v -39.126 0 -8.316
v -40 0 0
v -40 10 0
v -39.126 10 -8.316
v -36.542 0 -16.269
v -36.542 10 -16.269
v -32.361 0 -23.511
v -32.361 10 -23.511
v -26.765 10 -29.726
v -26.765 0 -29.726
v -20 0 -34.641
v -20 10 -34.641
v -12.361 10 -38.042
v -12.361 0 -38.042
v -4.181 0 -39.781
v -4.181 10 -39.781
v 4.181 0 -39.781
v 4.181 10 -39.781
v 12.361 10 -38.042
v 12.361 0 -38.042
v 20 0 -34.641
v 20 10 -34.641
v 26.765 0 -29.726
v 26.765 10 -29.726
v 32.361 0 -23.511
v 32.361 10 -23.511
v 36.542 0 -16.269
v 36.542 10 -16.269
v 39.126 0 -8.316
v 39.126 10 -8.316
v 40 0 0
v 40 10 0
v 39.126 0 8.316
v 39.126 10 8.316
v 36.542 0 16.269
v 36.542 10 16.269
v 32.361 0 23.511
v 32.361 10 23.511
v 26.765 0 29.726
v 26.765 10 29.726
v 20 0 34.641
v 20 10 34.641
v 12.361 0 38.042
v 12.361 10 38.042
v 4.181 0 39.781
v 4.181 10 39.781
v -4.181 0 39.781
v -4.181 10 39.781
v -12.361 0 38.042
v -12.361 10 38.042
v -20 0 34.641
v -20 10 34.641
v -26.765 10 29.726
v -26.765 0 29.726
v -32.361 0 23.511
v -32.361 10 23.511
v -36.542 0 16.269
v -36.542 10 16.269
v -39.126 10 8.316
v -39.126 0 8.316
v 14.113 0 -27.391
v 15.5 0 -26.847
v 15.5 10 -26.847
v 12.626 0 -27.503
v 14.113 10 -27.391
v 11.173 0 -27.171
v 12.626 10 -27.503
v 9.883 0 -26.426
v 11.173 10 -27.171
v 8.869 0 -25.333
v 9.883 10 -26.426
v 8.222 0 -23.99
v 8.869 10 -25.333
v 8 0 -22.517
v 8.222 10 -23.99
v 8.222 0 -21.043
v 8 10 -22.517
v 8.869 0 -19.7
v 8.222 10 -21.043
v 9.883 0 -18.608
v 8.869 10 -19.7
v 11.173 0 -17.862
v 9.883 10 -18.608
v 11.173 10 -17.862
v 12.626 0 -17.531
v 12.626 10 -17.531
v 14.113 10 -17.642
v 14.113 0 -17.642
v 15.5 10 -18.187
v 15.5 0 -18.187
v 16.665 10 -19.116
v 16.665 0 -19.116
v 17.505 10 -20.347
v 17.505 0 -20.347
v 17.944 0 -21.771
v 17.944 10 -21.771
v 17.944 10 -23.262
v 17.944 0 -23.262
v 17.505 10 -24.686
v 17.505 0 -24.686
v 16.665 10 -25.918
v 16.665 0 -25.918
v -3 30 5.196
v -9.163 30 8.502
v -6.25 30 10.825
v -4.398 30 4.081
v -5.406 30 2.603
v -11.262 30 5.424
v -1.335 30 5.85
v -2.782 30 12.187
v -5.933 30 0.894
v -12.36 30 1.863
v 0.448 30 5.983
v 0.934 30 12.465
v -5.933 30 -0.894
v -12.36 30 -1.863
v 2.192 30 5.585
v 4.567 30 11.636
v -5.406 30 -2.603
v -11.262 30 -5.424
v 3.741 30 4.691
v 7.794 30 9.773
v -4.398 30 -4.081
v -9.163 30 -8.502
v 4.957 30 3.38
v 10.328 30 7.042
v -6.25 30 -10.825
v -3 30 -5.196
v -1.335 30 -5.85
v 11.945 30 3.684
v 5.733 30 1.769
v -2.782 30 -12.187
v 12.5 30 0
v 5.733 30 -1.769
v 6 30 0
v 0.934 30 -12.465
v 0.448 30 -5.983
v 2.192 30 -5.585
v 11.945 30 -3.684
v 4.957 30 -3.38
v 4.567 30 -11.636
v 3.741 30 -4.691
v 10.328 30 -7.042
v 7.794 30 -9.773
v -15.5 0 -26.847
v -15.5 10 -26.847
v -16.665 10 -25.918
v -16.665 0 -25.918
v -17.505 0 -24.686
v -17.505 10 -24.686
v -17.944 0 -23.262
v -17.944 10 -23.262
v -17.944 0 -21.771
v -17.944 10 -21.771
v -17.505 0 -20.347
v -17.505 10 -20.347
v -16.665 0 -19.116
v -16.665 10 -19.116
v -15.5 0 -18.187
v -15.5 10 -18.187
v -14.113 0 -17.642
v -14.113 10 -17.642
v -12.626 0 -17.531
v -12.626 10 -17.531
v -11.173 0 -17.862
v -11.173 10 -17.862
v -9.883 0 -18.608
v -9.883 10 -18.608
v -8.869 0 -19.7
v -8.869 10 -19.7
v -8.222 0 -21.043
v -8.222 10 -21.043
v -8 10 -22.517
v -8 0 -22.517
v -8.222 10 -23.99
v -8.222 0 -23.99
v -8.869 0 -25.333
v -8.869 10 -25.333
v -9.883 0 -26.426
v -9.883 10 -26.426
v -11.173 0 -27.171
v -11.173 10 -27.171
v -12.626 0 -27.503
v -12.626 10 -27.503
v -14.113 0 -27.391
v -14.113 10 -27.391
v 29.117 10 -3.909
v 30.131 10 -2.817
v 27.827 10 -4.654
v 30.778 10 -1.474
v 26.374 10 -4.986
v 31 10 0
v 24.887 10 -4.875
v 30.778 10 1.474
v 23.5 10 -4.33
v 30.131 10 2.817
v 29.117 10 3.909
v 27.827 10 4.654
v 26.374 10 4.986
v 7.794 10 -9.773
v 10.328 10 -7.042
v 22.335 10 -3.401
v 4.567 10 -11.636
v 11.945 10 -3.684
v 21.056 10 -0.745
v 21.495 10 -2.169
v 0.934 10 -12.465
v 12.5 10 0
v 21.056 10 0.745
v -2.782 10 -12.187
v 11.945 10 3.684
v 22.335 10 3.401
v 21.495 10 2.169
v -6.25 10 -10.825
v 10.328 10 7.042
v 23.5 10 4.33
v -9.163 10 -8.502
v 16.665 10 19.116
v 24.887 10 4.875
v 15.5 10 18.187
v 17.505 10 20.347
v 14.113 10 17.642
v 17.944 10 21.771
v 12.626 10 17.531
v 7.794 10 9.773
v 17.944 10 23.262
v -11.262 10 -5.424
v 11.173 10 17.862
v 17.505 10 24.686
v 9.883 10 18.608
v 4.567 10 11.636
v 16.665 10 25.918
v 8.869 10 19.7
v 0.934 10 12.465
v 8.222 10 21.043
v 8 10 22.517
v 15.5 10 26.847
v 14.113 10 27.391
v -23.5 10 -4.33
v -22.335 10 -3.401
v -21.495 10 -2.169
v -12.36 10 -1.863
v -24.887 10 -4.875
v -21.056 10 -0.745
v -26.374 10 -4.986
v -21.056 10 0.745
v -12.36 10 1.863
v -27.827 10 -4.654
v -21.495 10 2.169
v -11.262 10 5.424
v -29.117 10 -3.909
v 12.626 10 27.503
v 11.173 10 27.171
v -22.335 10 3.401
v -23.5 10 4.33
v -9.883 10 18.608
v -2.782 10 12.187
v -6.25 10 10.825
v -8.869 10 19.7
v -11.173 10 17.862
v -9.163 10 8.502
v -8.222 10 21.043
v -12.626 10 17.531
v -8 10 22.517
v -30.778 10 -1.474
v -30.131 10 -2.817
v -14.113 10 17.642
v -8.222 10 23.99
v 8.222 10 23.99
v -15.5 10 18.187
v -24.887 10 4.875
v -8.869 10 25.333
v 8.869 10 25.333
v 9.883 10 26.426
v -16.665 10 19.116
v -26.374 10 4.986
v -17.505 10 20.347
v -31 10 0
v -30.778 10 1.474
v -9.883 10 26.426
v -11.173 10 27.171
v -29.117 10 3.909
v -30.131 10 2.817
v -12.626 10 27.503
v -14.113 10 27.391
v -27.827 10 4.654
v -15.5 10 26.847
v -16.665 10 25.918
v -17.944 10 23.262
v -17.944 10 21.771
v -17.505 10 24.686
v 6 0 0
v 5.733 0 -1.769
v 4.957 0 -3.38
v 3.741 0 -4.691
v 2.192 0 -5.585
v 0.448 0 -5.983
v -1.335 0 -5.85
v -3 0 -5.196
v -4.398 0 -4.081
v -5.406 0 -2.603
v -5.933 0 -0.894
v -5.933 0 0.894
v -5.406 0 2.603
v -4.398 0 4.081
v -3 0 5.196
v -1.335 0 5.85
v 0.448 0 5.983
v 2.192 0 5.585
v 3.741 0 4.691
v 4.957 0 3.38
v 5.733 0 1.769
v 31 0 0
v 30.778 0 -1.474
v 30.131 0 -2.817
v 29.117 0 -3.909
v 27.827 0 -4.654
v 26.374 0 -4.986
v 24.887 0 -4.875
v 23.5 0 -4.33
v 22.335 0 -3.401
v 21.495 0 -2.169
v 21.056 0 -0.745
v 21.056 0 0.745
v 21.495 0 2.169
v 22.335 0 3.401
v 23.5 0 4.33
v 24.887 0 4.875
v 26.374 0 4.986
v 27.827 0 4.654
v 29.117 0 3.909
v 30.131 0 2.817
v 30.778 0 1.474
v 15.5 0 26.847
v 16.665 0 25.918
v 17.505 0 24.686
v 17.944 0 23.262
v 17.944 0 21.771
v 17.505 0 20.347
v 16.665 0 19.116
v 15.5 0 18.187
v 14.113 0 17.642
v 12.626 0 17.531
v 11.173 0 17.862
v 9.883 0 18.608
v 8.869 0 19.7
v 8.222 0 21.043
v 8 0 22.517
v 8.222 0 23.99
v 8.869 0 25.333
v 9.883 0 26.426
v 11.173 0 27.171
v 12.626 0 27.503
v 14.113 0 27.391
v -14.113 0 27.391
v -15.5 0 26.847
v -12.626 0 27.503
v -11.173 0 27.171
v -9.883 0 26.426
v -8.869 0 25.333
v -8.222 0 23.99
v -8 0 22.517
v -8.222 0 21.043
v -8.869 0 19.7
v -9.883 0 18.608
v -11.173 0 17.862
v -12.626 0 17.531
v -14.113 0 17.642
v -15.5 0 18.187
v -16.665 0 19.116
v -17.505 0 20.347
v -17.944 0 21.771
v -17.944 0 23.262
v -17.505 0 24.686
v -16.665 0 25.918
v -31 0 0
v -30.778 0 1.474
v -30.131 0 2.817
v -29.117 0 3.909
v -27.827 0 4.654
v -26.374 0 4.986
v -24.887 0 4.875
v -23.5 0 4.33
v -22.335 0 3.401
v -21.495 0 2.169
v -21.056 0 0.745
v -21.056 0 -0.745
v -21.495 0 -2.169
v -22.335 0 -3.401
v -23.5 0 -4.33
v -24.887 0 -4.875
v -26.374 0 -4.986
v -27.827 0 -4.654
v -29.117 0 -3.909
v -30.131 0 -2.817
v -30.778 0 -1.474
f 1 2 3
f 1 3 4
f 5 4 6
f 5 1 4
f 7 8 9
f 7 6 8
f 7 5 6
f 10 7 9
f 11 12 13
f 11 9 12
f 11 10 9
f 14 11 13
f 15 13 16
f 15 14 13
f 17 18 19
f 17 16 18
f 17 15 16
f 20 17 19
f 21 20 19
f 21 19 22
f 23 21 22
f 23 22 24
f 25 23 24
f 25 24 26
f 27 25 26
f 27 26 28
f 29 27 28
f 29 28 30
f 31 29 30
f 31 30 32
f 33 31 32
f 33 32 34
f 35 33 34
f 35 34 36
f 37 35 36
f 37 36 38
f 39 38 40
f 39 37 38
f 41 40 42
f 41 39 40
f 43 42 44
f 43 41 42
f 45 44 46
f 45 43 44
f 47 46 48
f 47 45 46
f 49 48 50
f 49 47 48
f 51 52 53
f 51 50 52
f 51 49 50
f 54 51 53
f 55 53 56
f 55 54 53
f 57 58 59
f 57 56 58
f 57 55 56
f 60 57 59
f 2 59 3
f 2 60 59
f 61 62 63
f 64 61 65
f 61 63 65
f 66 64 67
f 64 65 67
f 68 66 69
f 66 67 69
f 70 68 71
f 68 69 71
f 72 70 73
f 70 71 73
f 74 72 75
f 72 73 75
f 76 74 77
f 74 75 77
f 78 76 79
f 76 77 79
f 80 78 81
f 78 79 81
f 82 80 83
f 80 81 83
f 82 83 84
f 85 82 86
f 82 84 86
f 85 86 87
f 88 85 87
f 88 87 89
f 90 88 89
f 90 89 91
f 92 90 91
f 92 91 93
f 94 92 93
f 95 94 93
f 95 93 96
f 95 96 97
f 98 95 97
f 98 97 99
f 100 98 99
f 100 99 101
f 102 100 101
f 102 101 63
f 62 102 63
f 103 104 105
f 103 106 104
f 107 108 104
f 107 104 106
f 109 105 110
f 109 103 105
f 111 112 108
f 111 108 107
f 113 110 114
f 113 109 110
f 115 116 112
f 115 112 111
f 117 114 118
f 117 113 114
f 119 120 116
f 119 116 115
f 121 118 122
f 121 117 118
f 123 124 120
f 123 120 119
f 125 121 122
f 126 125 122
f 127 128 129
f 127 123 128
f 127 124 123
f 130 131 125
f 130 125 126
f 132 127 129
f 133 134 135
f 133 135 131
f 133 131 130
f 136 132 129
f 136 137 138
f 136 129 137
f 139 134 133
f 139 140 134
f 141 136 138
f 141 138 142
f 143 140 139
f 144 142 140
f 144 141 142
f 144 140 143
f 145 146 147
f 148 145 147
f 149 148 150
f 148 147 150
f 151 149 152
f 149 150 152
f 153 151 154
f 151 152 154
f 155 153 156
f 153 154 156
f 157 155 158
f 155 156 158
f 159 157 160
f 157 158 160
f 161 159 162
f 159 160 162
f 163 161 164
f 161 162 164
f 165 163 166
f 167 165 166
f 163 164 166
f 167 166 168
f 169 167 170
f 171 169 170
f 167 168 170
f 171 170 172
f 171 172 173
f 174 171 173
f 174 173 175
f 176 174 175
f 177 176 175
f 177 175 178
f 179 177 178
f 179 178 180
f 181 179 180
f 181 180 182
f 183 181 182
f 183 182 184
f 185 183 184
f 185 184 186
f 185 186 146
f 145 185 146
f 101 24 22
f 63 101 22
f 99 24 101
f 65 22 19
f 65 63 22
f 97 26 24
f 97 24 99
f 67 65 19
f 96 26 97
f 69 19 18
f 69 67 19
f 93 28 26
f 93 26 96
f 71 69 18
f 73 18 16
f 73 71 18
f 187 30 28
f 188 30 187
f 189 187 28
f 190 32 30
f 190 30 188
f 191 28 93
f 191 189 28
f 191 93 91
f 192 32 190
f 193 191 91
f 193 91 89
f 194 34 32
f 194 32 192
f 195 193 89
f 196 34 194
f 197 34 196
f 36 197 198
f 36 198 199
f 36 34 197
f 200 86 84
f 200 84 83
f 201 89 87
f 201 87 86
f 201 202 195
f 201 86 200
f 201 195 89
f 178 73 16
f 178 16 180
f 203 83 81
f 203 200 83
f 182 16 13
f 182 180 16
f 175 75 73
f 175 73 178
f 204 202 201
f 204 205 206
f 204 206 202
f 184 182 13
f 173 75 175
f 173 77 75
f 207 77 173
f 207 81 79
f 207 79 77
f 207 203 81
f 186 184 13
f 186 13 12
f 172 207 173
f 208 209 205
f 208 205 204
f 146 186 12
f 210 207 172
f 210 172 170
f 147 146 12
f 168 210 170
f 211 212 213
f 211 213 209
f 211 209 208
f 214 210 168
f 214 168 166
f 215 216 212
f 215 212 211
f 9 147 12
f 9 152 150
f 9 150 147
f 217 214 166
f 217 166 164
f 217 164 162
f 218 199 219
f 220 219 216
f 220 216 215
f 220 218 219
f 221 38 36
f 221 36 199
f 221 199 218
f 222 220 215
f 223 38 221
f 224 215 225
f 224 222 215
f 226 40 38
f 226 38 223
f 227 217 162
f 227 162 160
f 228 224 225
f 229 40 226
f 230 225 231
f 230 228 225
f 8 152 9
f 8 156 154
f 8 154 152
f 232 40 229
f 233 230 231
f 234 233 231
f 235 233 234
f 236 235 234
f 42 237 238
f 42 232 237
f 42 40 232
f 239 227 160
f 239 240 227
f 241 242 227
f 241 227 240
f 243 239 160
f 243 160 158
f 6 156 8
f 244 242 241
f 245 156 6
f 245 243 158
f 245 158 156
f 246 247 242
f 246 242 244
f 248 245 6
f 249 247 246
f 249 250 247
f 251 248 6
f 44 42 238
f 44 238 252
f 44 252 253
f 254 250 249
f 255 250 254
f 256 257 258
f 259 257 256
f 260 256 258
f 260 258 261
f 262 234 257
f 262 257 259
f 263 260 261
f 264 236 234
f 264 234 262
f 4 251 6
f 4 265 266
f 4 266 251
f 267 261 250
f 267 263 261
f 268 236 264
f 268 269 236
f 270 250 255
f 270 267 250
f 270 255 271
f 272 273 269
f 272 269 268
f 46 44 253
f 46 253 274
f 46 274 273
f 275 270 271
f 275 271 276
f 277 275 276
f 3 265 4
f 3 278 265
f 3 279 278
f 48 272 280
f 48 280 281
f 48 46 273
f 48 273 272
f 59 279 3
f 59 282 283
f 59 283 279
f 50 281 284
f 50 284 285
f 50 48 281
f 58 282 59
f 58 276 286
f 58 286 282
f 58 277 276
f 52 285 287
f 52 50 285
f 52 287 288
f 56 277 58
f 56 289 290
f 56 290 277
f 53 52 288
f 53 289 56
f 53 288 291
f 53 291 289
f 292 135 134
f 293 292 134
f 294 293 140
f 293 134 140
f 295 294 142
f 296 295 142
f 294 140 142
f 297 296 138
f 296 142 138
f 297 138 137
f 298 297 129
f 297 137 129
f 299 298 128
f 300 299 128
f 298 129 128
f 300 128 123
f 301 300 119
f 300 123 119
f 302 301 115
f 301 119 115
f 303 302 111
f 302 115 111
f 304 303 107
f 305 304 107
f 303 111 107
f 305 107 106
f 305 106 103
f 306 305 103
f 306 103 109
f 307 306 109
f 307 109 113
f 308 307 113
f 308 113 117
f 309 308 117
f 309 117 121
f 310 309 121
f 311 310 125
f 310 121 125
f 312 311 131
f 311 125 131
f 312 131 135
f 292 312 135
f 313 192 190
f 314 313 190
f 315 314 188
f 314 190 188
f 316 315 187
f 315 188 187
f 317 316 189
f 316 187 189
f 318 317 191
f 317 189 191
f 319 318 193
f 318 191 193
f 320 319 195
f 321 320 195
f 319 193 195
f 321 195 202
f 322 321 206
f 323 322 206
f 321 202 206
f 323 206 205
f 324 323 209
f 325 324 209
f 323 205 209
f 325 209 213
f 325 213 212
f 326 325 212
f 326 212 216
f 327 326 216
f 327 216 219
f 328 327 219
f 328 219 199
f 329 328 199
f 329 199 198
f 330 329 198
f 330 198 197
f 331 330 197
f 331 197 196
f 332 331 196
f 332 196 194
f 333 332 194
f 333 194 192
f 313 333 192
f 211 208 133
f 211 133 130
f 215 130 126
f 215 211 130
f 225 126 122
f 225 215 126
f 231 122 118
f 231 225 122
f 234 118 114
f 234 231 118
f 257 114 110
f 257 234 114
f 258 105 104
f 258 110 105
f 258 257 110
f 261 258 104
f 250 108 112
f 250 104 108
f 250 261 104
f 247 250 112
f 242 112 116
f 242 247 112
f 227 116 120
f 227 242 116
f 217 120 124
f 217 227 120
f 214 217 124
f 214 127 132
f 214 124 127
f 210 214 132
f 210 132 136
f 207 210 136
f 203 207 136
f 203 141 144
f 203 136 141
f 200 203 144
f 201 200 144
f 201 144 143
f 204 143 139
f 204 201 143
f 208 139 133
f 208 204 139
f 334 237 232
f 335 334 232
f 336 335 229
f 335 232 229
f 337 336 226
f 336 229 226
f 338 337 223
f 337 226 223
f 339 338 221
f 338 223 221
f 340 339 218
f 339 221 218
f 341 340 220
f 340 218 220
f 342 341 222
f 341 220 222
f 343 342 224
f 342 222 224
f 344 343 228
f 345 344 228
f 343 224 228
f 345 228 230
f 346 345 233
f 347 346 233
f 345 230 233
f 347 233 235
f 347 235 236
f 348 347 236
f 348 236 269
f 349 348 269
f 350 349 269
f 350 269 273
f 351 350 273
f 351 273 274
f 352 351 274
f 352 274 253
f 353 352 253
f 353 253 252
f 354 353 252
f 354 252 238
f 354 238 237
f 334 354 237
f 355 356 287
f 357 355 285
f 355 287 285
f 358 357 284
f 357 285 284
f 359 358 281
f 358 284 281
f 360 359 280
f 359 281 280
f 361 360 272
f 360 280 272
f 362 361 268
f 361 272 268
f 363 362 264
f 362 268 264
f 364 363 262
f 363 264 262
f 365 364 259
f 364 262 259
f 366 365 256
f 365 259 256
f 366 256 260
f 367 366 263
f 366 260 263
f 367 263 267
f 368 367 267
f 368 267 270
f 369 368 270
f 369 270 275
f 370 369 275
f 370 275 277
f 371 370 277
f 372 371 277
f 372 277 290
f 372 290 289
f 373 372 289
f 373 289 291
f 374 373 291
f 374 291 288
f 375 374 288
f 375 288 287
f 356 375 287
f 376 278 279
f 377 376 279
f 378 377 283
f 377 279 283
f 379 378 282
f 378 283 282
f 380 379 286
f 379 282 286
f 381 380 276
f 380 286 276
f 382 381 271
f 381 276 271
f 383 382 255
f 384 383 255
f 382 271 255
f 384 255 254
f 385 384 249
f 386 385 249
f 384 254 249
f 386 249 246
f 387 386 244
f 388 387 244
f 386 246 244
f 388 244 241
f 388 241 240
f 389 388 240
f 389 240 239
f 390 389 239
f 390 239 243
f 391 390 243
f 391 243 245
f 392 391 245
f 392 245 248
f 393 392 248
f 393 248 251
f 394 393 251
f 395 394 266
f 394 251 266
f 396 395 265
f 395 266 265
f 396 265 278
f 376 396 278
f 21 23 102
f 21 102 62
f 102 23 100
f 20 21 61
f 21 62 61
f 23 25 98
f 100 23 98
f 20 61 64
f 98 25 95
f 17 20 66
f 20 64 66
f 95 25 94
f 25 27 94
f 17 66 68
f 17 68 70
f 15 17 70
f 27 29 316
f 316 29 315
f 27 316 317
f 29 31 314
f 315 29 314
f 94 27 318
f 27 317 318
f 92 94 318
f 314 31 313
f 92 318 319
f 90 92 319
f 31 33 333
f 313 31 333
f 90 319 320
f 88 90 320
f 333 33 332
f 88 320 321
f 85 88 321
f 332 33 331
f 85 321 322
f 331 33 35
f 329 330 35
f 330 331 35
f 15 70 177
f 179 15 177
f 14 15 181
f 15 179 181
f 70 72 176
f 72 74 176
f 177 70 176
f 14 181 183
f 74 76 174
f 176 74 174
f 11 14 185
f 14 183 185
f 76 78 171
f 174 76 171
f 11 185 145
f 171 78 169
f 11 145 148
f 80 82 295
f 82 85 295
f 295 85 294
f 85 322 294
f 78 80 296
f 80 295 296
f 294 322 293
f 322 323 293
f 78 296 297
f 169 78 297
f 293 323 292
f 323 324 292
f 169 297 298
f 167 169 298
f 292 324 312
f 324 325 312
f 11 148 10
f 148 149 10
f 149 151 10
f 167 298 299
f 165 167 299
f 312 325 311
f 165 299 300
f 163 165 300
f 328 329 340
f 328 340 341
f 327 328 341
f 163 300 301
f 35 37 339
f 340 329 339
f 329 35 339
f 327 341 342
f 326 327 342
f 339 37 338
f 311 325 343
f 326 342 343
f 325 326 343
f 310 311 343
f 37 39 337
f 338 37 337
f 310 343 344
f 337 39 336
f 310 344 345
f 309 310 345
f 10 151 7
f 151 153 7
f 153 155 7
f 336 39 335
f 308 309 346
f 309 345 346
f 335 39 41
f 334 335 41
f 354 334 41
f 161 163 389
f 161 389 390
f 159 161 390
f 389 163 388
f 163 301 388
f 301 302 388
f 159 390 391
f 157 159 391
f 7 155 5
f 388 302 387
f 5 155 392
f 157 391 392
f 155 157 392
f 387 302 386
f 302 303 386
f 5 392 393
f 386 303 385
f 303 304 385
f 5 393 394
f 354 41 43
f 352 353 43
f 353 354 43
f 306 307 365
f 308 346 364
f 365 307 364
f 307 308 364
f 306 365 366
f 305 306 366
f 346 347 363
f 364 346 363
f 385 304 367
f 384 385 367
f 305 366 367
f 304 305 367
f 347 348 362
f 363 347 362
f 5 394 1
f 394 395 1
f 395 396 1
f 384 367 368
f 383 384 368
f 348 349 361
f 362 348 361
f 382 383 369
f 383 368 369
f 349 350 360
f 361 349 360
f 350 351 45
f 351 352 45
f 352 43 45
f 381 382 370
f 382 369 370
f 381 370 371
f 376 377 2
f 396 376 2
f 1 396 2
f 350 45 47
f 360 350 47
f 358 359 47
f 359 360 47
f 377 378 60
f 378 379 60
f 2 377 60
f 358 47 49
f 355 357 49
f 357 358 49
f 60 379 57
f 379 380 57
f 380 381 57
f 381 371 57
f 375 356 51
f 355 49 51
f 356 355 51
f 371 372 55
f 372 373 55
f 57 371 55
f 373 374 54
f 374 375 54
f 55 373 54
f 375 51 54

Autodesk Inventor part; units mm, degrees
ref_plane "YZ Plane" through (0, 0, 0) normal (1, 0, 0) x (0, 1, 0)
ref_plane "XZ Plane" through (0, 0, 0) normal (0, 1, 0) x (-1, 0, 0)
ref_plane "XY Plane" through (0, 0, 0) normal (0, 0, 1) x (1, 0, 0)
sketch "草圖1" plane through (0, 0, 0) normal (0, 1, 0) x (-1, 0, 0)
  circle A0 centre (0, 0) radius 40
  dimension "d0" = 80
extrude "擠出1" add sketch "草圖1" along normal blind 10
sketch "草圖2" plane through (0, 10, 0) normal (0, 1, 0) x (1, 0, 0)
  circle A0 centre (0, 0) radius 12.5
  dimension "d3" = 25
extrude "擠出2" add sketch "草圖2" along normal blind 20
sketch "草圖3" plane through (0, 30, 0) normal (0, 1, 0) x (1, 0, 0)
  circle A0 centre (0, 0) radius 6
  dimension "d6" = 12
extrude "擠出3" cut sketch "草圖3" against normal blind 60
sketch "草圖4" plane through (0, 10, 0) normal (0, 1, 0) x (1, 0, 0)
  circle A0 centre (0, 0) radius 6 projected
  circle A1 centre (0, 0) radius 26 construction
  circle A2 centre (26, 0) radius 5
  line L0 (0, 0) -> (48.0653, 0)
  dimension "d9" = 52
  dimension "d10" = 10
extrude "擠出4" cut sketch "草圖4" against normal blind 60 contours A2 L0 | L0 A2
pattern_circular "環形陣列1" count 6 over 360 about axis through (0, 30, 0) along (0, -1, 0) of "擠出4"
properties part number "練習三"
